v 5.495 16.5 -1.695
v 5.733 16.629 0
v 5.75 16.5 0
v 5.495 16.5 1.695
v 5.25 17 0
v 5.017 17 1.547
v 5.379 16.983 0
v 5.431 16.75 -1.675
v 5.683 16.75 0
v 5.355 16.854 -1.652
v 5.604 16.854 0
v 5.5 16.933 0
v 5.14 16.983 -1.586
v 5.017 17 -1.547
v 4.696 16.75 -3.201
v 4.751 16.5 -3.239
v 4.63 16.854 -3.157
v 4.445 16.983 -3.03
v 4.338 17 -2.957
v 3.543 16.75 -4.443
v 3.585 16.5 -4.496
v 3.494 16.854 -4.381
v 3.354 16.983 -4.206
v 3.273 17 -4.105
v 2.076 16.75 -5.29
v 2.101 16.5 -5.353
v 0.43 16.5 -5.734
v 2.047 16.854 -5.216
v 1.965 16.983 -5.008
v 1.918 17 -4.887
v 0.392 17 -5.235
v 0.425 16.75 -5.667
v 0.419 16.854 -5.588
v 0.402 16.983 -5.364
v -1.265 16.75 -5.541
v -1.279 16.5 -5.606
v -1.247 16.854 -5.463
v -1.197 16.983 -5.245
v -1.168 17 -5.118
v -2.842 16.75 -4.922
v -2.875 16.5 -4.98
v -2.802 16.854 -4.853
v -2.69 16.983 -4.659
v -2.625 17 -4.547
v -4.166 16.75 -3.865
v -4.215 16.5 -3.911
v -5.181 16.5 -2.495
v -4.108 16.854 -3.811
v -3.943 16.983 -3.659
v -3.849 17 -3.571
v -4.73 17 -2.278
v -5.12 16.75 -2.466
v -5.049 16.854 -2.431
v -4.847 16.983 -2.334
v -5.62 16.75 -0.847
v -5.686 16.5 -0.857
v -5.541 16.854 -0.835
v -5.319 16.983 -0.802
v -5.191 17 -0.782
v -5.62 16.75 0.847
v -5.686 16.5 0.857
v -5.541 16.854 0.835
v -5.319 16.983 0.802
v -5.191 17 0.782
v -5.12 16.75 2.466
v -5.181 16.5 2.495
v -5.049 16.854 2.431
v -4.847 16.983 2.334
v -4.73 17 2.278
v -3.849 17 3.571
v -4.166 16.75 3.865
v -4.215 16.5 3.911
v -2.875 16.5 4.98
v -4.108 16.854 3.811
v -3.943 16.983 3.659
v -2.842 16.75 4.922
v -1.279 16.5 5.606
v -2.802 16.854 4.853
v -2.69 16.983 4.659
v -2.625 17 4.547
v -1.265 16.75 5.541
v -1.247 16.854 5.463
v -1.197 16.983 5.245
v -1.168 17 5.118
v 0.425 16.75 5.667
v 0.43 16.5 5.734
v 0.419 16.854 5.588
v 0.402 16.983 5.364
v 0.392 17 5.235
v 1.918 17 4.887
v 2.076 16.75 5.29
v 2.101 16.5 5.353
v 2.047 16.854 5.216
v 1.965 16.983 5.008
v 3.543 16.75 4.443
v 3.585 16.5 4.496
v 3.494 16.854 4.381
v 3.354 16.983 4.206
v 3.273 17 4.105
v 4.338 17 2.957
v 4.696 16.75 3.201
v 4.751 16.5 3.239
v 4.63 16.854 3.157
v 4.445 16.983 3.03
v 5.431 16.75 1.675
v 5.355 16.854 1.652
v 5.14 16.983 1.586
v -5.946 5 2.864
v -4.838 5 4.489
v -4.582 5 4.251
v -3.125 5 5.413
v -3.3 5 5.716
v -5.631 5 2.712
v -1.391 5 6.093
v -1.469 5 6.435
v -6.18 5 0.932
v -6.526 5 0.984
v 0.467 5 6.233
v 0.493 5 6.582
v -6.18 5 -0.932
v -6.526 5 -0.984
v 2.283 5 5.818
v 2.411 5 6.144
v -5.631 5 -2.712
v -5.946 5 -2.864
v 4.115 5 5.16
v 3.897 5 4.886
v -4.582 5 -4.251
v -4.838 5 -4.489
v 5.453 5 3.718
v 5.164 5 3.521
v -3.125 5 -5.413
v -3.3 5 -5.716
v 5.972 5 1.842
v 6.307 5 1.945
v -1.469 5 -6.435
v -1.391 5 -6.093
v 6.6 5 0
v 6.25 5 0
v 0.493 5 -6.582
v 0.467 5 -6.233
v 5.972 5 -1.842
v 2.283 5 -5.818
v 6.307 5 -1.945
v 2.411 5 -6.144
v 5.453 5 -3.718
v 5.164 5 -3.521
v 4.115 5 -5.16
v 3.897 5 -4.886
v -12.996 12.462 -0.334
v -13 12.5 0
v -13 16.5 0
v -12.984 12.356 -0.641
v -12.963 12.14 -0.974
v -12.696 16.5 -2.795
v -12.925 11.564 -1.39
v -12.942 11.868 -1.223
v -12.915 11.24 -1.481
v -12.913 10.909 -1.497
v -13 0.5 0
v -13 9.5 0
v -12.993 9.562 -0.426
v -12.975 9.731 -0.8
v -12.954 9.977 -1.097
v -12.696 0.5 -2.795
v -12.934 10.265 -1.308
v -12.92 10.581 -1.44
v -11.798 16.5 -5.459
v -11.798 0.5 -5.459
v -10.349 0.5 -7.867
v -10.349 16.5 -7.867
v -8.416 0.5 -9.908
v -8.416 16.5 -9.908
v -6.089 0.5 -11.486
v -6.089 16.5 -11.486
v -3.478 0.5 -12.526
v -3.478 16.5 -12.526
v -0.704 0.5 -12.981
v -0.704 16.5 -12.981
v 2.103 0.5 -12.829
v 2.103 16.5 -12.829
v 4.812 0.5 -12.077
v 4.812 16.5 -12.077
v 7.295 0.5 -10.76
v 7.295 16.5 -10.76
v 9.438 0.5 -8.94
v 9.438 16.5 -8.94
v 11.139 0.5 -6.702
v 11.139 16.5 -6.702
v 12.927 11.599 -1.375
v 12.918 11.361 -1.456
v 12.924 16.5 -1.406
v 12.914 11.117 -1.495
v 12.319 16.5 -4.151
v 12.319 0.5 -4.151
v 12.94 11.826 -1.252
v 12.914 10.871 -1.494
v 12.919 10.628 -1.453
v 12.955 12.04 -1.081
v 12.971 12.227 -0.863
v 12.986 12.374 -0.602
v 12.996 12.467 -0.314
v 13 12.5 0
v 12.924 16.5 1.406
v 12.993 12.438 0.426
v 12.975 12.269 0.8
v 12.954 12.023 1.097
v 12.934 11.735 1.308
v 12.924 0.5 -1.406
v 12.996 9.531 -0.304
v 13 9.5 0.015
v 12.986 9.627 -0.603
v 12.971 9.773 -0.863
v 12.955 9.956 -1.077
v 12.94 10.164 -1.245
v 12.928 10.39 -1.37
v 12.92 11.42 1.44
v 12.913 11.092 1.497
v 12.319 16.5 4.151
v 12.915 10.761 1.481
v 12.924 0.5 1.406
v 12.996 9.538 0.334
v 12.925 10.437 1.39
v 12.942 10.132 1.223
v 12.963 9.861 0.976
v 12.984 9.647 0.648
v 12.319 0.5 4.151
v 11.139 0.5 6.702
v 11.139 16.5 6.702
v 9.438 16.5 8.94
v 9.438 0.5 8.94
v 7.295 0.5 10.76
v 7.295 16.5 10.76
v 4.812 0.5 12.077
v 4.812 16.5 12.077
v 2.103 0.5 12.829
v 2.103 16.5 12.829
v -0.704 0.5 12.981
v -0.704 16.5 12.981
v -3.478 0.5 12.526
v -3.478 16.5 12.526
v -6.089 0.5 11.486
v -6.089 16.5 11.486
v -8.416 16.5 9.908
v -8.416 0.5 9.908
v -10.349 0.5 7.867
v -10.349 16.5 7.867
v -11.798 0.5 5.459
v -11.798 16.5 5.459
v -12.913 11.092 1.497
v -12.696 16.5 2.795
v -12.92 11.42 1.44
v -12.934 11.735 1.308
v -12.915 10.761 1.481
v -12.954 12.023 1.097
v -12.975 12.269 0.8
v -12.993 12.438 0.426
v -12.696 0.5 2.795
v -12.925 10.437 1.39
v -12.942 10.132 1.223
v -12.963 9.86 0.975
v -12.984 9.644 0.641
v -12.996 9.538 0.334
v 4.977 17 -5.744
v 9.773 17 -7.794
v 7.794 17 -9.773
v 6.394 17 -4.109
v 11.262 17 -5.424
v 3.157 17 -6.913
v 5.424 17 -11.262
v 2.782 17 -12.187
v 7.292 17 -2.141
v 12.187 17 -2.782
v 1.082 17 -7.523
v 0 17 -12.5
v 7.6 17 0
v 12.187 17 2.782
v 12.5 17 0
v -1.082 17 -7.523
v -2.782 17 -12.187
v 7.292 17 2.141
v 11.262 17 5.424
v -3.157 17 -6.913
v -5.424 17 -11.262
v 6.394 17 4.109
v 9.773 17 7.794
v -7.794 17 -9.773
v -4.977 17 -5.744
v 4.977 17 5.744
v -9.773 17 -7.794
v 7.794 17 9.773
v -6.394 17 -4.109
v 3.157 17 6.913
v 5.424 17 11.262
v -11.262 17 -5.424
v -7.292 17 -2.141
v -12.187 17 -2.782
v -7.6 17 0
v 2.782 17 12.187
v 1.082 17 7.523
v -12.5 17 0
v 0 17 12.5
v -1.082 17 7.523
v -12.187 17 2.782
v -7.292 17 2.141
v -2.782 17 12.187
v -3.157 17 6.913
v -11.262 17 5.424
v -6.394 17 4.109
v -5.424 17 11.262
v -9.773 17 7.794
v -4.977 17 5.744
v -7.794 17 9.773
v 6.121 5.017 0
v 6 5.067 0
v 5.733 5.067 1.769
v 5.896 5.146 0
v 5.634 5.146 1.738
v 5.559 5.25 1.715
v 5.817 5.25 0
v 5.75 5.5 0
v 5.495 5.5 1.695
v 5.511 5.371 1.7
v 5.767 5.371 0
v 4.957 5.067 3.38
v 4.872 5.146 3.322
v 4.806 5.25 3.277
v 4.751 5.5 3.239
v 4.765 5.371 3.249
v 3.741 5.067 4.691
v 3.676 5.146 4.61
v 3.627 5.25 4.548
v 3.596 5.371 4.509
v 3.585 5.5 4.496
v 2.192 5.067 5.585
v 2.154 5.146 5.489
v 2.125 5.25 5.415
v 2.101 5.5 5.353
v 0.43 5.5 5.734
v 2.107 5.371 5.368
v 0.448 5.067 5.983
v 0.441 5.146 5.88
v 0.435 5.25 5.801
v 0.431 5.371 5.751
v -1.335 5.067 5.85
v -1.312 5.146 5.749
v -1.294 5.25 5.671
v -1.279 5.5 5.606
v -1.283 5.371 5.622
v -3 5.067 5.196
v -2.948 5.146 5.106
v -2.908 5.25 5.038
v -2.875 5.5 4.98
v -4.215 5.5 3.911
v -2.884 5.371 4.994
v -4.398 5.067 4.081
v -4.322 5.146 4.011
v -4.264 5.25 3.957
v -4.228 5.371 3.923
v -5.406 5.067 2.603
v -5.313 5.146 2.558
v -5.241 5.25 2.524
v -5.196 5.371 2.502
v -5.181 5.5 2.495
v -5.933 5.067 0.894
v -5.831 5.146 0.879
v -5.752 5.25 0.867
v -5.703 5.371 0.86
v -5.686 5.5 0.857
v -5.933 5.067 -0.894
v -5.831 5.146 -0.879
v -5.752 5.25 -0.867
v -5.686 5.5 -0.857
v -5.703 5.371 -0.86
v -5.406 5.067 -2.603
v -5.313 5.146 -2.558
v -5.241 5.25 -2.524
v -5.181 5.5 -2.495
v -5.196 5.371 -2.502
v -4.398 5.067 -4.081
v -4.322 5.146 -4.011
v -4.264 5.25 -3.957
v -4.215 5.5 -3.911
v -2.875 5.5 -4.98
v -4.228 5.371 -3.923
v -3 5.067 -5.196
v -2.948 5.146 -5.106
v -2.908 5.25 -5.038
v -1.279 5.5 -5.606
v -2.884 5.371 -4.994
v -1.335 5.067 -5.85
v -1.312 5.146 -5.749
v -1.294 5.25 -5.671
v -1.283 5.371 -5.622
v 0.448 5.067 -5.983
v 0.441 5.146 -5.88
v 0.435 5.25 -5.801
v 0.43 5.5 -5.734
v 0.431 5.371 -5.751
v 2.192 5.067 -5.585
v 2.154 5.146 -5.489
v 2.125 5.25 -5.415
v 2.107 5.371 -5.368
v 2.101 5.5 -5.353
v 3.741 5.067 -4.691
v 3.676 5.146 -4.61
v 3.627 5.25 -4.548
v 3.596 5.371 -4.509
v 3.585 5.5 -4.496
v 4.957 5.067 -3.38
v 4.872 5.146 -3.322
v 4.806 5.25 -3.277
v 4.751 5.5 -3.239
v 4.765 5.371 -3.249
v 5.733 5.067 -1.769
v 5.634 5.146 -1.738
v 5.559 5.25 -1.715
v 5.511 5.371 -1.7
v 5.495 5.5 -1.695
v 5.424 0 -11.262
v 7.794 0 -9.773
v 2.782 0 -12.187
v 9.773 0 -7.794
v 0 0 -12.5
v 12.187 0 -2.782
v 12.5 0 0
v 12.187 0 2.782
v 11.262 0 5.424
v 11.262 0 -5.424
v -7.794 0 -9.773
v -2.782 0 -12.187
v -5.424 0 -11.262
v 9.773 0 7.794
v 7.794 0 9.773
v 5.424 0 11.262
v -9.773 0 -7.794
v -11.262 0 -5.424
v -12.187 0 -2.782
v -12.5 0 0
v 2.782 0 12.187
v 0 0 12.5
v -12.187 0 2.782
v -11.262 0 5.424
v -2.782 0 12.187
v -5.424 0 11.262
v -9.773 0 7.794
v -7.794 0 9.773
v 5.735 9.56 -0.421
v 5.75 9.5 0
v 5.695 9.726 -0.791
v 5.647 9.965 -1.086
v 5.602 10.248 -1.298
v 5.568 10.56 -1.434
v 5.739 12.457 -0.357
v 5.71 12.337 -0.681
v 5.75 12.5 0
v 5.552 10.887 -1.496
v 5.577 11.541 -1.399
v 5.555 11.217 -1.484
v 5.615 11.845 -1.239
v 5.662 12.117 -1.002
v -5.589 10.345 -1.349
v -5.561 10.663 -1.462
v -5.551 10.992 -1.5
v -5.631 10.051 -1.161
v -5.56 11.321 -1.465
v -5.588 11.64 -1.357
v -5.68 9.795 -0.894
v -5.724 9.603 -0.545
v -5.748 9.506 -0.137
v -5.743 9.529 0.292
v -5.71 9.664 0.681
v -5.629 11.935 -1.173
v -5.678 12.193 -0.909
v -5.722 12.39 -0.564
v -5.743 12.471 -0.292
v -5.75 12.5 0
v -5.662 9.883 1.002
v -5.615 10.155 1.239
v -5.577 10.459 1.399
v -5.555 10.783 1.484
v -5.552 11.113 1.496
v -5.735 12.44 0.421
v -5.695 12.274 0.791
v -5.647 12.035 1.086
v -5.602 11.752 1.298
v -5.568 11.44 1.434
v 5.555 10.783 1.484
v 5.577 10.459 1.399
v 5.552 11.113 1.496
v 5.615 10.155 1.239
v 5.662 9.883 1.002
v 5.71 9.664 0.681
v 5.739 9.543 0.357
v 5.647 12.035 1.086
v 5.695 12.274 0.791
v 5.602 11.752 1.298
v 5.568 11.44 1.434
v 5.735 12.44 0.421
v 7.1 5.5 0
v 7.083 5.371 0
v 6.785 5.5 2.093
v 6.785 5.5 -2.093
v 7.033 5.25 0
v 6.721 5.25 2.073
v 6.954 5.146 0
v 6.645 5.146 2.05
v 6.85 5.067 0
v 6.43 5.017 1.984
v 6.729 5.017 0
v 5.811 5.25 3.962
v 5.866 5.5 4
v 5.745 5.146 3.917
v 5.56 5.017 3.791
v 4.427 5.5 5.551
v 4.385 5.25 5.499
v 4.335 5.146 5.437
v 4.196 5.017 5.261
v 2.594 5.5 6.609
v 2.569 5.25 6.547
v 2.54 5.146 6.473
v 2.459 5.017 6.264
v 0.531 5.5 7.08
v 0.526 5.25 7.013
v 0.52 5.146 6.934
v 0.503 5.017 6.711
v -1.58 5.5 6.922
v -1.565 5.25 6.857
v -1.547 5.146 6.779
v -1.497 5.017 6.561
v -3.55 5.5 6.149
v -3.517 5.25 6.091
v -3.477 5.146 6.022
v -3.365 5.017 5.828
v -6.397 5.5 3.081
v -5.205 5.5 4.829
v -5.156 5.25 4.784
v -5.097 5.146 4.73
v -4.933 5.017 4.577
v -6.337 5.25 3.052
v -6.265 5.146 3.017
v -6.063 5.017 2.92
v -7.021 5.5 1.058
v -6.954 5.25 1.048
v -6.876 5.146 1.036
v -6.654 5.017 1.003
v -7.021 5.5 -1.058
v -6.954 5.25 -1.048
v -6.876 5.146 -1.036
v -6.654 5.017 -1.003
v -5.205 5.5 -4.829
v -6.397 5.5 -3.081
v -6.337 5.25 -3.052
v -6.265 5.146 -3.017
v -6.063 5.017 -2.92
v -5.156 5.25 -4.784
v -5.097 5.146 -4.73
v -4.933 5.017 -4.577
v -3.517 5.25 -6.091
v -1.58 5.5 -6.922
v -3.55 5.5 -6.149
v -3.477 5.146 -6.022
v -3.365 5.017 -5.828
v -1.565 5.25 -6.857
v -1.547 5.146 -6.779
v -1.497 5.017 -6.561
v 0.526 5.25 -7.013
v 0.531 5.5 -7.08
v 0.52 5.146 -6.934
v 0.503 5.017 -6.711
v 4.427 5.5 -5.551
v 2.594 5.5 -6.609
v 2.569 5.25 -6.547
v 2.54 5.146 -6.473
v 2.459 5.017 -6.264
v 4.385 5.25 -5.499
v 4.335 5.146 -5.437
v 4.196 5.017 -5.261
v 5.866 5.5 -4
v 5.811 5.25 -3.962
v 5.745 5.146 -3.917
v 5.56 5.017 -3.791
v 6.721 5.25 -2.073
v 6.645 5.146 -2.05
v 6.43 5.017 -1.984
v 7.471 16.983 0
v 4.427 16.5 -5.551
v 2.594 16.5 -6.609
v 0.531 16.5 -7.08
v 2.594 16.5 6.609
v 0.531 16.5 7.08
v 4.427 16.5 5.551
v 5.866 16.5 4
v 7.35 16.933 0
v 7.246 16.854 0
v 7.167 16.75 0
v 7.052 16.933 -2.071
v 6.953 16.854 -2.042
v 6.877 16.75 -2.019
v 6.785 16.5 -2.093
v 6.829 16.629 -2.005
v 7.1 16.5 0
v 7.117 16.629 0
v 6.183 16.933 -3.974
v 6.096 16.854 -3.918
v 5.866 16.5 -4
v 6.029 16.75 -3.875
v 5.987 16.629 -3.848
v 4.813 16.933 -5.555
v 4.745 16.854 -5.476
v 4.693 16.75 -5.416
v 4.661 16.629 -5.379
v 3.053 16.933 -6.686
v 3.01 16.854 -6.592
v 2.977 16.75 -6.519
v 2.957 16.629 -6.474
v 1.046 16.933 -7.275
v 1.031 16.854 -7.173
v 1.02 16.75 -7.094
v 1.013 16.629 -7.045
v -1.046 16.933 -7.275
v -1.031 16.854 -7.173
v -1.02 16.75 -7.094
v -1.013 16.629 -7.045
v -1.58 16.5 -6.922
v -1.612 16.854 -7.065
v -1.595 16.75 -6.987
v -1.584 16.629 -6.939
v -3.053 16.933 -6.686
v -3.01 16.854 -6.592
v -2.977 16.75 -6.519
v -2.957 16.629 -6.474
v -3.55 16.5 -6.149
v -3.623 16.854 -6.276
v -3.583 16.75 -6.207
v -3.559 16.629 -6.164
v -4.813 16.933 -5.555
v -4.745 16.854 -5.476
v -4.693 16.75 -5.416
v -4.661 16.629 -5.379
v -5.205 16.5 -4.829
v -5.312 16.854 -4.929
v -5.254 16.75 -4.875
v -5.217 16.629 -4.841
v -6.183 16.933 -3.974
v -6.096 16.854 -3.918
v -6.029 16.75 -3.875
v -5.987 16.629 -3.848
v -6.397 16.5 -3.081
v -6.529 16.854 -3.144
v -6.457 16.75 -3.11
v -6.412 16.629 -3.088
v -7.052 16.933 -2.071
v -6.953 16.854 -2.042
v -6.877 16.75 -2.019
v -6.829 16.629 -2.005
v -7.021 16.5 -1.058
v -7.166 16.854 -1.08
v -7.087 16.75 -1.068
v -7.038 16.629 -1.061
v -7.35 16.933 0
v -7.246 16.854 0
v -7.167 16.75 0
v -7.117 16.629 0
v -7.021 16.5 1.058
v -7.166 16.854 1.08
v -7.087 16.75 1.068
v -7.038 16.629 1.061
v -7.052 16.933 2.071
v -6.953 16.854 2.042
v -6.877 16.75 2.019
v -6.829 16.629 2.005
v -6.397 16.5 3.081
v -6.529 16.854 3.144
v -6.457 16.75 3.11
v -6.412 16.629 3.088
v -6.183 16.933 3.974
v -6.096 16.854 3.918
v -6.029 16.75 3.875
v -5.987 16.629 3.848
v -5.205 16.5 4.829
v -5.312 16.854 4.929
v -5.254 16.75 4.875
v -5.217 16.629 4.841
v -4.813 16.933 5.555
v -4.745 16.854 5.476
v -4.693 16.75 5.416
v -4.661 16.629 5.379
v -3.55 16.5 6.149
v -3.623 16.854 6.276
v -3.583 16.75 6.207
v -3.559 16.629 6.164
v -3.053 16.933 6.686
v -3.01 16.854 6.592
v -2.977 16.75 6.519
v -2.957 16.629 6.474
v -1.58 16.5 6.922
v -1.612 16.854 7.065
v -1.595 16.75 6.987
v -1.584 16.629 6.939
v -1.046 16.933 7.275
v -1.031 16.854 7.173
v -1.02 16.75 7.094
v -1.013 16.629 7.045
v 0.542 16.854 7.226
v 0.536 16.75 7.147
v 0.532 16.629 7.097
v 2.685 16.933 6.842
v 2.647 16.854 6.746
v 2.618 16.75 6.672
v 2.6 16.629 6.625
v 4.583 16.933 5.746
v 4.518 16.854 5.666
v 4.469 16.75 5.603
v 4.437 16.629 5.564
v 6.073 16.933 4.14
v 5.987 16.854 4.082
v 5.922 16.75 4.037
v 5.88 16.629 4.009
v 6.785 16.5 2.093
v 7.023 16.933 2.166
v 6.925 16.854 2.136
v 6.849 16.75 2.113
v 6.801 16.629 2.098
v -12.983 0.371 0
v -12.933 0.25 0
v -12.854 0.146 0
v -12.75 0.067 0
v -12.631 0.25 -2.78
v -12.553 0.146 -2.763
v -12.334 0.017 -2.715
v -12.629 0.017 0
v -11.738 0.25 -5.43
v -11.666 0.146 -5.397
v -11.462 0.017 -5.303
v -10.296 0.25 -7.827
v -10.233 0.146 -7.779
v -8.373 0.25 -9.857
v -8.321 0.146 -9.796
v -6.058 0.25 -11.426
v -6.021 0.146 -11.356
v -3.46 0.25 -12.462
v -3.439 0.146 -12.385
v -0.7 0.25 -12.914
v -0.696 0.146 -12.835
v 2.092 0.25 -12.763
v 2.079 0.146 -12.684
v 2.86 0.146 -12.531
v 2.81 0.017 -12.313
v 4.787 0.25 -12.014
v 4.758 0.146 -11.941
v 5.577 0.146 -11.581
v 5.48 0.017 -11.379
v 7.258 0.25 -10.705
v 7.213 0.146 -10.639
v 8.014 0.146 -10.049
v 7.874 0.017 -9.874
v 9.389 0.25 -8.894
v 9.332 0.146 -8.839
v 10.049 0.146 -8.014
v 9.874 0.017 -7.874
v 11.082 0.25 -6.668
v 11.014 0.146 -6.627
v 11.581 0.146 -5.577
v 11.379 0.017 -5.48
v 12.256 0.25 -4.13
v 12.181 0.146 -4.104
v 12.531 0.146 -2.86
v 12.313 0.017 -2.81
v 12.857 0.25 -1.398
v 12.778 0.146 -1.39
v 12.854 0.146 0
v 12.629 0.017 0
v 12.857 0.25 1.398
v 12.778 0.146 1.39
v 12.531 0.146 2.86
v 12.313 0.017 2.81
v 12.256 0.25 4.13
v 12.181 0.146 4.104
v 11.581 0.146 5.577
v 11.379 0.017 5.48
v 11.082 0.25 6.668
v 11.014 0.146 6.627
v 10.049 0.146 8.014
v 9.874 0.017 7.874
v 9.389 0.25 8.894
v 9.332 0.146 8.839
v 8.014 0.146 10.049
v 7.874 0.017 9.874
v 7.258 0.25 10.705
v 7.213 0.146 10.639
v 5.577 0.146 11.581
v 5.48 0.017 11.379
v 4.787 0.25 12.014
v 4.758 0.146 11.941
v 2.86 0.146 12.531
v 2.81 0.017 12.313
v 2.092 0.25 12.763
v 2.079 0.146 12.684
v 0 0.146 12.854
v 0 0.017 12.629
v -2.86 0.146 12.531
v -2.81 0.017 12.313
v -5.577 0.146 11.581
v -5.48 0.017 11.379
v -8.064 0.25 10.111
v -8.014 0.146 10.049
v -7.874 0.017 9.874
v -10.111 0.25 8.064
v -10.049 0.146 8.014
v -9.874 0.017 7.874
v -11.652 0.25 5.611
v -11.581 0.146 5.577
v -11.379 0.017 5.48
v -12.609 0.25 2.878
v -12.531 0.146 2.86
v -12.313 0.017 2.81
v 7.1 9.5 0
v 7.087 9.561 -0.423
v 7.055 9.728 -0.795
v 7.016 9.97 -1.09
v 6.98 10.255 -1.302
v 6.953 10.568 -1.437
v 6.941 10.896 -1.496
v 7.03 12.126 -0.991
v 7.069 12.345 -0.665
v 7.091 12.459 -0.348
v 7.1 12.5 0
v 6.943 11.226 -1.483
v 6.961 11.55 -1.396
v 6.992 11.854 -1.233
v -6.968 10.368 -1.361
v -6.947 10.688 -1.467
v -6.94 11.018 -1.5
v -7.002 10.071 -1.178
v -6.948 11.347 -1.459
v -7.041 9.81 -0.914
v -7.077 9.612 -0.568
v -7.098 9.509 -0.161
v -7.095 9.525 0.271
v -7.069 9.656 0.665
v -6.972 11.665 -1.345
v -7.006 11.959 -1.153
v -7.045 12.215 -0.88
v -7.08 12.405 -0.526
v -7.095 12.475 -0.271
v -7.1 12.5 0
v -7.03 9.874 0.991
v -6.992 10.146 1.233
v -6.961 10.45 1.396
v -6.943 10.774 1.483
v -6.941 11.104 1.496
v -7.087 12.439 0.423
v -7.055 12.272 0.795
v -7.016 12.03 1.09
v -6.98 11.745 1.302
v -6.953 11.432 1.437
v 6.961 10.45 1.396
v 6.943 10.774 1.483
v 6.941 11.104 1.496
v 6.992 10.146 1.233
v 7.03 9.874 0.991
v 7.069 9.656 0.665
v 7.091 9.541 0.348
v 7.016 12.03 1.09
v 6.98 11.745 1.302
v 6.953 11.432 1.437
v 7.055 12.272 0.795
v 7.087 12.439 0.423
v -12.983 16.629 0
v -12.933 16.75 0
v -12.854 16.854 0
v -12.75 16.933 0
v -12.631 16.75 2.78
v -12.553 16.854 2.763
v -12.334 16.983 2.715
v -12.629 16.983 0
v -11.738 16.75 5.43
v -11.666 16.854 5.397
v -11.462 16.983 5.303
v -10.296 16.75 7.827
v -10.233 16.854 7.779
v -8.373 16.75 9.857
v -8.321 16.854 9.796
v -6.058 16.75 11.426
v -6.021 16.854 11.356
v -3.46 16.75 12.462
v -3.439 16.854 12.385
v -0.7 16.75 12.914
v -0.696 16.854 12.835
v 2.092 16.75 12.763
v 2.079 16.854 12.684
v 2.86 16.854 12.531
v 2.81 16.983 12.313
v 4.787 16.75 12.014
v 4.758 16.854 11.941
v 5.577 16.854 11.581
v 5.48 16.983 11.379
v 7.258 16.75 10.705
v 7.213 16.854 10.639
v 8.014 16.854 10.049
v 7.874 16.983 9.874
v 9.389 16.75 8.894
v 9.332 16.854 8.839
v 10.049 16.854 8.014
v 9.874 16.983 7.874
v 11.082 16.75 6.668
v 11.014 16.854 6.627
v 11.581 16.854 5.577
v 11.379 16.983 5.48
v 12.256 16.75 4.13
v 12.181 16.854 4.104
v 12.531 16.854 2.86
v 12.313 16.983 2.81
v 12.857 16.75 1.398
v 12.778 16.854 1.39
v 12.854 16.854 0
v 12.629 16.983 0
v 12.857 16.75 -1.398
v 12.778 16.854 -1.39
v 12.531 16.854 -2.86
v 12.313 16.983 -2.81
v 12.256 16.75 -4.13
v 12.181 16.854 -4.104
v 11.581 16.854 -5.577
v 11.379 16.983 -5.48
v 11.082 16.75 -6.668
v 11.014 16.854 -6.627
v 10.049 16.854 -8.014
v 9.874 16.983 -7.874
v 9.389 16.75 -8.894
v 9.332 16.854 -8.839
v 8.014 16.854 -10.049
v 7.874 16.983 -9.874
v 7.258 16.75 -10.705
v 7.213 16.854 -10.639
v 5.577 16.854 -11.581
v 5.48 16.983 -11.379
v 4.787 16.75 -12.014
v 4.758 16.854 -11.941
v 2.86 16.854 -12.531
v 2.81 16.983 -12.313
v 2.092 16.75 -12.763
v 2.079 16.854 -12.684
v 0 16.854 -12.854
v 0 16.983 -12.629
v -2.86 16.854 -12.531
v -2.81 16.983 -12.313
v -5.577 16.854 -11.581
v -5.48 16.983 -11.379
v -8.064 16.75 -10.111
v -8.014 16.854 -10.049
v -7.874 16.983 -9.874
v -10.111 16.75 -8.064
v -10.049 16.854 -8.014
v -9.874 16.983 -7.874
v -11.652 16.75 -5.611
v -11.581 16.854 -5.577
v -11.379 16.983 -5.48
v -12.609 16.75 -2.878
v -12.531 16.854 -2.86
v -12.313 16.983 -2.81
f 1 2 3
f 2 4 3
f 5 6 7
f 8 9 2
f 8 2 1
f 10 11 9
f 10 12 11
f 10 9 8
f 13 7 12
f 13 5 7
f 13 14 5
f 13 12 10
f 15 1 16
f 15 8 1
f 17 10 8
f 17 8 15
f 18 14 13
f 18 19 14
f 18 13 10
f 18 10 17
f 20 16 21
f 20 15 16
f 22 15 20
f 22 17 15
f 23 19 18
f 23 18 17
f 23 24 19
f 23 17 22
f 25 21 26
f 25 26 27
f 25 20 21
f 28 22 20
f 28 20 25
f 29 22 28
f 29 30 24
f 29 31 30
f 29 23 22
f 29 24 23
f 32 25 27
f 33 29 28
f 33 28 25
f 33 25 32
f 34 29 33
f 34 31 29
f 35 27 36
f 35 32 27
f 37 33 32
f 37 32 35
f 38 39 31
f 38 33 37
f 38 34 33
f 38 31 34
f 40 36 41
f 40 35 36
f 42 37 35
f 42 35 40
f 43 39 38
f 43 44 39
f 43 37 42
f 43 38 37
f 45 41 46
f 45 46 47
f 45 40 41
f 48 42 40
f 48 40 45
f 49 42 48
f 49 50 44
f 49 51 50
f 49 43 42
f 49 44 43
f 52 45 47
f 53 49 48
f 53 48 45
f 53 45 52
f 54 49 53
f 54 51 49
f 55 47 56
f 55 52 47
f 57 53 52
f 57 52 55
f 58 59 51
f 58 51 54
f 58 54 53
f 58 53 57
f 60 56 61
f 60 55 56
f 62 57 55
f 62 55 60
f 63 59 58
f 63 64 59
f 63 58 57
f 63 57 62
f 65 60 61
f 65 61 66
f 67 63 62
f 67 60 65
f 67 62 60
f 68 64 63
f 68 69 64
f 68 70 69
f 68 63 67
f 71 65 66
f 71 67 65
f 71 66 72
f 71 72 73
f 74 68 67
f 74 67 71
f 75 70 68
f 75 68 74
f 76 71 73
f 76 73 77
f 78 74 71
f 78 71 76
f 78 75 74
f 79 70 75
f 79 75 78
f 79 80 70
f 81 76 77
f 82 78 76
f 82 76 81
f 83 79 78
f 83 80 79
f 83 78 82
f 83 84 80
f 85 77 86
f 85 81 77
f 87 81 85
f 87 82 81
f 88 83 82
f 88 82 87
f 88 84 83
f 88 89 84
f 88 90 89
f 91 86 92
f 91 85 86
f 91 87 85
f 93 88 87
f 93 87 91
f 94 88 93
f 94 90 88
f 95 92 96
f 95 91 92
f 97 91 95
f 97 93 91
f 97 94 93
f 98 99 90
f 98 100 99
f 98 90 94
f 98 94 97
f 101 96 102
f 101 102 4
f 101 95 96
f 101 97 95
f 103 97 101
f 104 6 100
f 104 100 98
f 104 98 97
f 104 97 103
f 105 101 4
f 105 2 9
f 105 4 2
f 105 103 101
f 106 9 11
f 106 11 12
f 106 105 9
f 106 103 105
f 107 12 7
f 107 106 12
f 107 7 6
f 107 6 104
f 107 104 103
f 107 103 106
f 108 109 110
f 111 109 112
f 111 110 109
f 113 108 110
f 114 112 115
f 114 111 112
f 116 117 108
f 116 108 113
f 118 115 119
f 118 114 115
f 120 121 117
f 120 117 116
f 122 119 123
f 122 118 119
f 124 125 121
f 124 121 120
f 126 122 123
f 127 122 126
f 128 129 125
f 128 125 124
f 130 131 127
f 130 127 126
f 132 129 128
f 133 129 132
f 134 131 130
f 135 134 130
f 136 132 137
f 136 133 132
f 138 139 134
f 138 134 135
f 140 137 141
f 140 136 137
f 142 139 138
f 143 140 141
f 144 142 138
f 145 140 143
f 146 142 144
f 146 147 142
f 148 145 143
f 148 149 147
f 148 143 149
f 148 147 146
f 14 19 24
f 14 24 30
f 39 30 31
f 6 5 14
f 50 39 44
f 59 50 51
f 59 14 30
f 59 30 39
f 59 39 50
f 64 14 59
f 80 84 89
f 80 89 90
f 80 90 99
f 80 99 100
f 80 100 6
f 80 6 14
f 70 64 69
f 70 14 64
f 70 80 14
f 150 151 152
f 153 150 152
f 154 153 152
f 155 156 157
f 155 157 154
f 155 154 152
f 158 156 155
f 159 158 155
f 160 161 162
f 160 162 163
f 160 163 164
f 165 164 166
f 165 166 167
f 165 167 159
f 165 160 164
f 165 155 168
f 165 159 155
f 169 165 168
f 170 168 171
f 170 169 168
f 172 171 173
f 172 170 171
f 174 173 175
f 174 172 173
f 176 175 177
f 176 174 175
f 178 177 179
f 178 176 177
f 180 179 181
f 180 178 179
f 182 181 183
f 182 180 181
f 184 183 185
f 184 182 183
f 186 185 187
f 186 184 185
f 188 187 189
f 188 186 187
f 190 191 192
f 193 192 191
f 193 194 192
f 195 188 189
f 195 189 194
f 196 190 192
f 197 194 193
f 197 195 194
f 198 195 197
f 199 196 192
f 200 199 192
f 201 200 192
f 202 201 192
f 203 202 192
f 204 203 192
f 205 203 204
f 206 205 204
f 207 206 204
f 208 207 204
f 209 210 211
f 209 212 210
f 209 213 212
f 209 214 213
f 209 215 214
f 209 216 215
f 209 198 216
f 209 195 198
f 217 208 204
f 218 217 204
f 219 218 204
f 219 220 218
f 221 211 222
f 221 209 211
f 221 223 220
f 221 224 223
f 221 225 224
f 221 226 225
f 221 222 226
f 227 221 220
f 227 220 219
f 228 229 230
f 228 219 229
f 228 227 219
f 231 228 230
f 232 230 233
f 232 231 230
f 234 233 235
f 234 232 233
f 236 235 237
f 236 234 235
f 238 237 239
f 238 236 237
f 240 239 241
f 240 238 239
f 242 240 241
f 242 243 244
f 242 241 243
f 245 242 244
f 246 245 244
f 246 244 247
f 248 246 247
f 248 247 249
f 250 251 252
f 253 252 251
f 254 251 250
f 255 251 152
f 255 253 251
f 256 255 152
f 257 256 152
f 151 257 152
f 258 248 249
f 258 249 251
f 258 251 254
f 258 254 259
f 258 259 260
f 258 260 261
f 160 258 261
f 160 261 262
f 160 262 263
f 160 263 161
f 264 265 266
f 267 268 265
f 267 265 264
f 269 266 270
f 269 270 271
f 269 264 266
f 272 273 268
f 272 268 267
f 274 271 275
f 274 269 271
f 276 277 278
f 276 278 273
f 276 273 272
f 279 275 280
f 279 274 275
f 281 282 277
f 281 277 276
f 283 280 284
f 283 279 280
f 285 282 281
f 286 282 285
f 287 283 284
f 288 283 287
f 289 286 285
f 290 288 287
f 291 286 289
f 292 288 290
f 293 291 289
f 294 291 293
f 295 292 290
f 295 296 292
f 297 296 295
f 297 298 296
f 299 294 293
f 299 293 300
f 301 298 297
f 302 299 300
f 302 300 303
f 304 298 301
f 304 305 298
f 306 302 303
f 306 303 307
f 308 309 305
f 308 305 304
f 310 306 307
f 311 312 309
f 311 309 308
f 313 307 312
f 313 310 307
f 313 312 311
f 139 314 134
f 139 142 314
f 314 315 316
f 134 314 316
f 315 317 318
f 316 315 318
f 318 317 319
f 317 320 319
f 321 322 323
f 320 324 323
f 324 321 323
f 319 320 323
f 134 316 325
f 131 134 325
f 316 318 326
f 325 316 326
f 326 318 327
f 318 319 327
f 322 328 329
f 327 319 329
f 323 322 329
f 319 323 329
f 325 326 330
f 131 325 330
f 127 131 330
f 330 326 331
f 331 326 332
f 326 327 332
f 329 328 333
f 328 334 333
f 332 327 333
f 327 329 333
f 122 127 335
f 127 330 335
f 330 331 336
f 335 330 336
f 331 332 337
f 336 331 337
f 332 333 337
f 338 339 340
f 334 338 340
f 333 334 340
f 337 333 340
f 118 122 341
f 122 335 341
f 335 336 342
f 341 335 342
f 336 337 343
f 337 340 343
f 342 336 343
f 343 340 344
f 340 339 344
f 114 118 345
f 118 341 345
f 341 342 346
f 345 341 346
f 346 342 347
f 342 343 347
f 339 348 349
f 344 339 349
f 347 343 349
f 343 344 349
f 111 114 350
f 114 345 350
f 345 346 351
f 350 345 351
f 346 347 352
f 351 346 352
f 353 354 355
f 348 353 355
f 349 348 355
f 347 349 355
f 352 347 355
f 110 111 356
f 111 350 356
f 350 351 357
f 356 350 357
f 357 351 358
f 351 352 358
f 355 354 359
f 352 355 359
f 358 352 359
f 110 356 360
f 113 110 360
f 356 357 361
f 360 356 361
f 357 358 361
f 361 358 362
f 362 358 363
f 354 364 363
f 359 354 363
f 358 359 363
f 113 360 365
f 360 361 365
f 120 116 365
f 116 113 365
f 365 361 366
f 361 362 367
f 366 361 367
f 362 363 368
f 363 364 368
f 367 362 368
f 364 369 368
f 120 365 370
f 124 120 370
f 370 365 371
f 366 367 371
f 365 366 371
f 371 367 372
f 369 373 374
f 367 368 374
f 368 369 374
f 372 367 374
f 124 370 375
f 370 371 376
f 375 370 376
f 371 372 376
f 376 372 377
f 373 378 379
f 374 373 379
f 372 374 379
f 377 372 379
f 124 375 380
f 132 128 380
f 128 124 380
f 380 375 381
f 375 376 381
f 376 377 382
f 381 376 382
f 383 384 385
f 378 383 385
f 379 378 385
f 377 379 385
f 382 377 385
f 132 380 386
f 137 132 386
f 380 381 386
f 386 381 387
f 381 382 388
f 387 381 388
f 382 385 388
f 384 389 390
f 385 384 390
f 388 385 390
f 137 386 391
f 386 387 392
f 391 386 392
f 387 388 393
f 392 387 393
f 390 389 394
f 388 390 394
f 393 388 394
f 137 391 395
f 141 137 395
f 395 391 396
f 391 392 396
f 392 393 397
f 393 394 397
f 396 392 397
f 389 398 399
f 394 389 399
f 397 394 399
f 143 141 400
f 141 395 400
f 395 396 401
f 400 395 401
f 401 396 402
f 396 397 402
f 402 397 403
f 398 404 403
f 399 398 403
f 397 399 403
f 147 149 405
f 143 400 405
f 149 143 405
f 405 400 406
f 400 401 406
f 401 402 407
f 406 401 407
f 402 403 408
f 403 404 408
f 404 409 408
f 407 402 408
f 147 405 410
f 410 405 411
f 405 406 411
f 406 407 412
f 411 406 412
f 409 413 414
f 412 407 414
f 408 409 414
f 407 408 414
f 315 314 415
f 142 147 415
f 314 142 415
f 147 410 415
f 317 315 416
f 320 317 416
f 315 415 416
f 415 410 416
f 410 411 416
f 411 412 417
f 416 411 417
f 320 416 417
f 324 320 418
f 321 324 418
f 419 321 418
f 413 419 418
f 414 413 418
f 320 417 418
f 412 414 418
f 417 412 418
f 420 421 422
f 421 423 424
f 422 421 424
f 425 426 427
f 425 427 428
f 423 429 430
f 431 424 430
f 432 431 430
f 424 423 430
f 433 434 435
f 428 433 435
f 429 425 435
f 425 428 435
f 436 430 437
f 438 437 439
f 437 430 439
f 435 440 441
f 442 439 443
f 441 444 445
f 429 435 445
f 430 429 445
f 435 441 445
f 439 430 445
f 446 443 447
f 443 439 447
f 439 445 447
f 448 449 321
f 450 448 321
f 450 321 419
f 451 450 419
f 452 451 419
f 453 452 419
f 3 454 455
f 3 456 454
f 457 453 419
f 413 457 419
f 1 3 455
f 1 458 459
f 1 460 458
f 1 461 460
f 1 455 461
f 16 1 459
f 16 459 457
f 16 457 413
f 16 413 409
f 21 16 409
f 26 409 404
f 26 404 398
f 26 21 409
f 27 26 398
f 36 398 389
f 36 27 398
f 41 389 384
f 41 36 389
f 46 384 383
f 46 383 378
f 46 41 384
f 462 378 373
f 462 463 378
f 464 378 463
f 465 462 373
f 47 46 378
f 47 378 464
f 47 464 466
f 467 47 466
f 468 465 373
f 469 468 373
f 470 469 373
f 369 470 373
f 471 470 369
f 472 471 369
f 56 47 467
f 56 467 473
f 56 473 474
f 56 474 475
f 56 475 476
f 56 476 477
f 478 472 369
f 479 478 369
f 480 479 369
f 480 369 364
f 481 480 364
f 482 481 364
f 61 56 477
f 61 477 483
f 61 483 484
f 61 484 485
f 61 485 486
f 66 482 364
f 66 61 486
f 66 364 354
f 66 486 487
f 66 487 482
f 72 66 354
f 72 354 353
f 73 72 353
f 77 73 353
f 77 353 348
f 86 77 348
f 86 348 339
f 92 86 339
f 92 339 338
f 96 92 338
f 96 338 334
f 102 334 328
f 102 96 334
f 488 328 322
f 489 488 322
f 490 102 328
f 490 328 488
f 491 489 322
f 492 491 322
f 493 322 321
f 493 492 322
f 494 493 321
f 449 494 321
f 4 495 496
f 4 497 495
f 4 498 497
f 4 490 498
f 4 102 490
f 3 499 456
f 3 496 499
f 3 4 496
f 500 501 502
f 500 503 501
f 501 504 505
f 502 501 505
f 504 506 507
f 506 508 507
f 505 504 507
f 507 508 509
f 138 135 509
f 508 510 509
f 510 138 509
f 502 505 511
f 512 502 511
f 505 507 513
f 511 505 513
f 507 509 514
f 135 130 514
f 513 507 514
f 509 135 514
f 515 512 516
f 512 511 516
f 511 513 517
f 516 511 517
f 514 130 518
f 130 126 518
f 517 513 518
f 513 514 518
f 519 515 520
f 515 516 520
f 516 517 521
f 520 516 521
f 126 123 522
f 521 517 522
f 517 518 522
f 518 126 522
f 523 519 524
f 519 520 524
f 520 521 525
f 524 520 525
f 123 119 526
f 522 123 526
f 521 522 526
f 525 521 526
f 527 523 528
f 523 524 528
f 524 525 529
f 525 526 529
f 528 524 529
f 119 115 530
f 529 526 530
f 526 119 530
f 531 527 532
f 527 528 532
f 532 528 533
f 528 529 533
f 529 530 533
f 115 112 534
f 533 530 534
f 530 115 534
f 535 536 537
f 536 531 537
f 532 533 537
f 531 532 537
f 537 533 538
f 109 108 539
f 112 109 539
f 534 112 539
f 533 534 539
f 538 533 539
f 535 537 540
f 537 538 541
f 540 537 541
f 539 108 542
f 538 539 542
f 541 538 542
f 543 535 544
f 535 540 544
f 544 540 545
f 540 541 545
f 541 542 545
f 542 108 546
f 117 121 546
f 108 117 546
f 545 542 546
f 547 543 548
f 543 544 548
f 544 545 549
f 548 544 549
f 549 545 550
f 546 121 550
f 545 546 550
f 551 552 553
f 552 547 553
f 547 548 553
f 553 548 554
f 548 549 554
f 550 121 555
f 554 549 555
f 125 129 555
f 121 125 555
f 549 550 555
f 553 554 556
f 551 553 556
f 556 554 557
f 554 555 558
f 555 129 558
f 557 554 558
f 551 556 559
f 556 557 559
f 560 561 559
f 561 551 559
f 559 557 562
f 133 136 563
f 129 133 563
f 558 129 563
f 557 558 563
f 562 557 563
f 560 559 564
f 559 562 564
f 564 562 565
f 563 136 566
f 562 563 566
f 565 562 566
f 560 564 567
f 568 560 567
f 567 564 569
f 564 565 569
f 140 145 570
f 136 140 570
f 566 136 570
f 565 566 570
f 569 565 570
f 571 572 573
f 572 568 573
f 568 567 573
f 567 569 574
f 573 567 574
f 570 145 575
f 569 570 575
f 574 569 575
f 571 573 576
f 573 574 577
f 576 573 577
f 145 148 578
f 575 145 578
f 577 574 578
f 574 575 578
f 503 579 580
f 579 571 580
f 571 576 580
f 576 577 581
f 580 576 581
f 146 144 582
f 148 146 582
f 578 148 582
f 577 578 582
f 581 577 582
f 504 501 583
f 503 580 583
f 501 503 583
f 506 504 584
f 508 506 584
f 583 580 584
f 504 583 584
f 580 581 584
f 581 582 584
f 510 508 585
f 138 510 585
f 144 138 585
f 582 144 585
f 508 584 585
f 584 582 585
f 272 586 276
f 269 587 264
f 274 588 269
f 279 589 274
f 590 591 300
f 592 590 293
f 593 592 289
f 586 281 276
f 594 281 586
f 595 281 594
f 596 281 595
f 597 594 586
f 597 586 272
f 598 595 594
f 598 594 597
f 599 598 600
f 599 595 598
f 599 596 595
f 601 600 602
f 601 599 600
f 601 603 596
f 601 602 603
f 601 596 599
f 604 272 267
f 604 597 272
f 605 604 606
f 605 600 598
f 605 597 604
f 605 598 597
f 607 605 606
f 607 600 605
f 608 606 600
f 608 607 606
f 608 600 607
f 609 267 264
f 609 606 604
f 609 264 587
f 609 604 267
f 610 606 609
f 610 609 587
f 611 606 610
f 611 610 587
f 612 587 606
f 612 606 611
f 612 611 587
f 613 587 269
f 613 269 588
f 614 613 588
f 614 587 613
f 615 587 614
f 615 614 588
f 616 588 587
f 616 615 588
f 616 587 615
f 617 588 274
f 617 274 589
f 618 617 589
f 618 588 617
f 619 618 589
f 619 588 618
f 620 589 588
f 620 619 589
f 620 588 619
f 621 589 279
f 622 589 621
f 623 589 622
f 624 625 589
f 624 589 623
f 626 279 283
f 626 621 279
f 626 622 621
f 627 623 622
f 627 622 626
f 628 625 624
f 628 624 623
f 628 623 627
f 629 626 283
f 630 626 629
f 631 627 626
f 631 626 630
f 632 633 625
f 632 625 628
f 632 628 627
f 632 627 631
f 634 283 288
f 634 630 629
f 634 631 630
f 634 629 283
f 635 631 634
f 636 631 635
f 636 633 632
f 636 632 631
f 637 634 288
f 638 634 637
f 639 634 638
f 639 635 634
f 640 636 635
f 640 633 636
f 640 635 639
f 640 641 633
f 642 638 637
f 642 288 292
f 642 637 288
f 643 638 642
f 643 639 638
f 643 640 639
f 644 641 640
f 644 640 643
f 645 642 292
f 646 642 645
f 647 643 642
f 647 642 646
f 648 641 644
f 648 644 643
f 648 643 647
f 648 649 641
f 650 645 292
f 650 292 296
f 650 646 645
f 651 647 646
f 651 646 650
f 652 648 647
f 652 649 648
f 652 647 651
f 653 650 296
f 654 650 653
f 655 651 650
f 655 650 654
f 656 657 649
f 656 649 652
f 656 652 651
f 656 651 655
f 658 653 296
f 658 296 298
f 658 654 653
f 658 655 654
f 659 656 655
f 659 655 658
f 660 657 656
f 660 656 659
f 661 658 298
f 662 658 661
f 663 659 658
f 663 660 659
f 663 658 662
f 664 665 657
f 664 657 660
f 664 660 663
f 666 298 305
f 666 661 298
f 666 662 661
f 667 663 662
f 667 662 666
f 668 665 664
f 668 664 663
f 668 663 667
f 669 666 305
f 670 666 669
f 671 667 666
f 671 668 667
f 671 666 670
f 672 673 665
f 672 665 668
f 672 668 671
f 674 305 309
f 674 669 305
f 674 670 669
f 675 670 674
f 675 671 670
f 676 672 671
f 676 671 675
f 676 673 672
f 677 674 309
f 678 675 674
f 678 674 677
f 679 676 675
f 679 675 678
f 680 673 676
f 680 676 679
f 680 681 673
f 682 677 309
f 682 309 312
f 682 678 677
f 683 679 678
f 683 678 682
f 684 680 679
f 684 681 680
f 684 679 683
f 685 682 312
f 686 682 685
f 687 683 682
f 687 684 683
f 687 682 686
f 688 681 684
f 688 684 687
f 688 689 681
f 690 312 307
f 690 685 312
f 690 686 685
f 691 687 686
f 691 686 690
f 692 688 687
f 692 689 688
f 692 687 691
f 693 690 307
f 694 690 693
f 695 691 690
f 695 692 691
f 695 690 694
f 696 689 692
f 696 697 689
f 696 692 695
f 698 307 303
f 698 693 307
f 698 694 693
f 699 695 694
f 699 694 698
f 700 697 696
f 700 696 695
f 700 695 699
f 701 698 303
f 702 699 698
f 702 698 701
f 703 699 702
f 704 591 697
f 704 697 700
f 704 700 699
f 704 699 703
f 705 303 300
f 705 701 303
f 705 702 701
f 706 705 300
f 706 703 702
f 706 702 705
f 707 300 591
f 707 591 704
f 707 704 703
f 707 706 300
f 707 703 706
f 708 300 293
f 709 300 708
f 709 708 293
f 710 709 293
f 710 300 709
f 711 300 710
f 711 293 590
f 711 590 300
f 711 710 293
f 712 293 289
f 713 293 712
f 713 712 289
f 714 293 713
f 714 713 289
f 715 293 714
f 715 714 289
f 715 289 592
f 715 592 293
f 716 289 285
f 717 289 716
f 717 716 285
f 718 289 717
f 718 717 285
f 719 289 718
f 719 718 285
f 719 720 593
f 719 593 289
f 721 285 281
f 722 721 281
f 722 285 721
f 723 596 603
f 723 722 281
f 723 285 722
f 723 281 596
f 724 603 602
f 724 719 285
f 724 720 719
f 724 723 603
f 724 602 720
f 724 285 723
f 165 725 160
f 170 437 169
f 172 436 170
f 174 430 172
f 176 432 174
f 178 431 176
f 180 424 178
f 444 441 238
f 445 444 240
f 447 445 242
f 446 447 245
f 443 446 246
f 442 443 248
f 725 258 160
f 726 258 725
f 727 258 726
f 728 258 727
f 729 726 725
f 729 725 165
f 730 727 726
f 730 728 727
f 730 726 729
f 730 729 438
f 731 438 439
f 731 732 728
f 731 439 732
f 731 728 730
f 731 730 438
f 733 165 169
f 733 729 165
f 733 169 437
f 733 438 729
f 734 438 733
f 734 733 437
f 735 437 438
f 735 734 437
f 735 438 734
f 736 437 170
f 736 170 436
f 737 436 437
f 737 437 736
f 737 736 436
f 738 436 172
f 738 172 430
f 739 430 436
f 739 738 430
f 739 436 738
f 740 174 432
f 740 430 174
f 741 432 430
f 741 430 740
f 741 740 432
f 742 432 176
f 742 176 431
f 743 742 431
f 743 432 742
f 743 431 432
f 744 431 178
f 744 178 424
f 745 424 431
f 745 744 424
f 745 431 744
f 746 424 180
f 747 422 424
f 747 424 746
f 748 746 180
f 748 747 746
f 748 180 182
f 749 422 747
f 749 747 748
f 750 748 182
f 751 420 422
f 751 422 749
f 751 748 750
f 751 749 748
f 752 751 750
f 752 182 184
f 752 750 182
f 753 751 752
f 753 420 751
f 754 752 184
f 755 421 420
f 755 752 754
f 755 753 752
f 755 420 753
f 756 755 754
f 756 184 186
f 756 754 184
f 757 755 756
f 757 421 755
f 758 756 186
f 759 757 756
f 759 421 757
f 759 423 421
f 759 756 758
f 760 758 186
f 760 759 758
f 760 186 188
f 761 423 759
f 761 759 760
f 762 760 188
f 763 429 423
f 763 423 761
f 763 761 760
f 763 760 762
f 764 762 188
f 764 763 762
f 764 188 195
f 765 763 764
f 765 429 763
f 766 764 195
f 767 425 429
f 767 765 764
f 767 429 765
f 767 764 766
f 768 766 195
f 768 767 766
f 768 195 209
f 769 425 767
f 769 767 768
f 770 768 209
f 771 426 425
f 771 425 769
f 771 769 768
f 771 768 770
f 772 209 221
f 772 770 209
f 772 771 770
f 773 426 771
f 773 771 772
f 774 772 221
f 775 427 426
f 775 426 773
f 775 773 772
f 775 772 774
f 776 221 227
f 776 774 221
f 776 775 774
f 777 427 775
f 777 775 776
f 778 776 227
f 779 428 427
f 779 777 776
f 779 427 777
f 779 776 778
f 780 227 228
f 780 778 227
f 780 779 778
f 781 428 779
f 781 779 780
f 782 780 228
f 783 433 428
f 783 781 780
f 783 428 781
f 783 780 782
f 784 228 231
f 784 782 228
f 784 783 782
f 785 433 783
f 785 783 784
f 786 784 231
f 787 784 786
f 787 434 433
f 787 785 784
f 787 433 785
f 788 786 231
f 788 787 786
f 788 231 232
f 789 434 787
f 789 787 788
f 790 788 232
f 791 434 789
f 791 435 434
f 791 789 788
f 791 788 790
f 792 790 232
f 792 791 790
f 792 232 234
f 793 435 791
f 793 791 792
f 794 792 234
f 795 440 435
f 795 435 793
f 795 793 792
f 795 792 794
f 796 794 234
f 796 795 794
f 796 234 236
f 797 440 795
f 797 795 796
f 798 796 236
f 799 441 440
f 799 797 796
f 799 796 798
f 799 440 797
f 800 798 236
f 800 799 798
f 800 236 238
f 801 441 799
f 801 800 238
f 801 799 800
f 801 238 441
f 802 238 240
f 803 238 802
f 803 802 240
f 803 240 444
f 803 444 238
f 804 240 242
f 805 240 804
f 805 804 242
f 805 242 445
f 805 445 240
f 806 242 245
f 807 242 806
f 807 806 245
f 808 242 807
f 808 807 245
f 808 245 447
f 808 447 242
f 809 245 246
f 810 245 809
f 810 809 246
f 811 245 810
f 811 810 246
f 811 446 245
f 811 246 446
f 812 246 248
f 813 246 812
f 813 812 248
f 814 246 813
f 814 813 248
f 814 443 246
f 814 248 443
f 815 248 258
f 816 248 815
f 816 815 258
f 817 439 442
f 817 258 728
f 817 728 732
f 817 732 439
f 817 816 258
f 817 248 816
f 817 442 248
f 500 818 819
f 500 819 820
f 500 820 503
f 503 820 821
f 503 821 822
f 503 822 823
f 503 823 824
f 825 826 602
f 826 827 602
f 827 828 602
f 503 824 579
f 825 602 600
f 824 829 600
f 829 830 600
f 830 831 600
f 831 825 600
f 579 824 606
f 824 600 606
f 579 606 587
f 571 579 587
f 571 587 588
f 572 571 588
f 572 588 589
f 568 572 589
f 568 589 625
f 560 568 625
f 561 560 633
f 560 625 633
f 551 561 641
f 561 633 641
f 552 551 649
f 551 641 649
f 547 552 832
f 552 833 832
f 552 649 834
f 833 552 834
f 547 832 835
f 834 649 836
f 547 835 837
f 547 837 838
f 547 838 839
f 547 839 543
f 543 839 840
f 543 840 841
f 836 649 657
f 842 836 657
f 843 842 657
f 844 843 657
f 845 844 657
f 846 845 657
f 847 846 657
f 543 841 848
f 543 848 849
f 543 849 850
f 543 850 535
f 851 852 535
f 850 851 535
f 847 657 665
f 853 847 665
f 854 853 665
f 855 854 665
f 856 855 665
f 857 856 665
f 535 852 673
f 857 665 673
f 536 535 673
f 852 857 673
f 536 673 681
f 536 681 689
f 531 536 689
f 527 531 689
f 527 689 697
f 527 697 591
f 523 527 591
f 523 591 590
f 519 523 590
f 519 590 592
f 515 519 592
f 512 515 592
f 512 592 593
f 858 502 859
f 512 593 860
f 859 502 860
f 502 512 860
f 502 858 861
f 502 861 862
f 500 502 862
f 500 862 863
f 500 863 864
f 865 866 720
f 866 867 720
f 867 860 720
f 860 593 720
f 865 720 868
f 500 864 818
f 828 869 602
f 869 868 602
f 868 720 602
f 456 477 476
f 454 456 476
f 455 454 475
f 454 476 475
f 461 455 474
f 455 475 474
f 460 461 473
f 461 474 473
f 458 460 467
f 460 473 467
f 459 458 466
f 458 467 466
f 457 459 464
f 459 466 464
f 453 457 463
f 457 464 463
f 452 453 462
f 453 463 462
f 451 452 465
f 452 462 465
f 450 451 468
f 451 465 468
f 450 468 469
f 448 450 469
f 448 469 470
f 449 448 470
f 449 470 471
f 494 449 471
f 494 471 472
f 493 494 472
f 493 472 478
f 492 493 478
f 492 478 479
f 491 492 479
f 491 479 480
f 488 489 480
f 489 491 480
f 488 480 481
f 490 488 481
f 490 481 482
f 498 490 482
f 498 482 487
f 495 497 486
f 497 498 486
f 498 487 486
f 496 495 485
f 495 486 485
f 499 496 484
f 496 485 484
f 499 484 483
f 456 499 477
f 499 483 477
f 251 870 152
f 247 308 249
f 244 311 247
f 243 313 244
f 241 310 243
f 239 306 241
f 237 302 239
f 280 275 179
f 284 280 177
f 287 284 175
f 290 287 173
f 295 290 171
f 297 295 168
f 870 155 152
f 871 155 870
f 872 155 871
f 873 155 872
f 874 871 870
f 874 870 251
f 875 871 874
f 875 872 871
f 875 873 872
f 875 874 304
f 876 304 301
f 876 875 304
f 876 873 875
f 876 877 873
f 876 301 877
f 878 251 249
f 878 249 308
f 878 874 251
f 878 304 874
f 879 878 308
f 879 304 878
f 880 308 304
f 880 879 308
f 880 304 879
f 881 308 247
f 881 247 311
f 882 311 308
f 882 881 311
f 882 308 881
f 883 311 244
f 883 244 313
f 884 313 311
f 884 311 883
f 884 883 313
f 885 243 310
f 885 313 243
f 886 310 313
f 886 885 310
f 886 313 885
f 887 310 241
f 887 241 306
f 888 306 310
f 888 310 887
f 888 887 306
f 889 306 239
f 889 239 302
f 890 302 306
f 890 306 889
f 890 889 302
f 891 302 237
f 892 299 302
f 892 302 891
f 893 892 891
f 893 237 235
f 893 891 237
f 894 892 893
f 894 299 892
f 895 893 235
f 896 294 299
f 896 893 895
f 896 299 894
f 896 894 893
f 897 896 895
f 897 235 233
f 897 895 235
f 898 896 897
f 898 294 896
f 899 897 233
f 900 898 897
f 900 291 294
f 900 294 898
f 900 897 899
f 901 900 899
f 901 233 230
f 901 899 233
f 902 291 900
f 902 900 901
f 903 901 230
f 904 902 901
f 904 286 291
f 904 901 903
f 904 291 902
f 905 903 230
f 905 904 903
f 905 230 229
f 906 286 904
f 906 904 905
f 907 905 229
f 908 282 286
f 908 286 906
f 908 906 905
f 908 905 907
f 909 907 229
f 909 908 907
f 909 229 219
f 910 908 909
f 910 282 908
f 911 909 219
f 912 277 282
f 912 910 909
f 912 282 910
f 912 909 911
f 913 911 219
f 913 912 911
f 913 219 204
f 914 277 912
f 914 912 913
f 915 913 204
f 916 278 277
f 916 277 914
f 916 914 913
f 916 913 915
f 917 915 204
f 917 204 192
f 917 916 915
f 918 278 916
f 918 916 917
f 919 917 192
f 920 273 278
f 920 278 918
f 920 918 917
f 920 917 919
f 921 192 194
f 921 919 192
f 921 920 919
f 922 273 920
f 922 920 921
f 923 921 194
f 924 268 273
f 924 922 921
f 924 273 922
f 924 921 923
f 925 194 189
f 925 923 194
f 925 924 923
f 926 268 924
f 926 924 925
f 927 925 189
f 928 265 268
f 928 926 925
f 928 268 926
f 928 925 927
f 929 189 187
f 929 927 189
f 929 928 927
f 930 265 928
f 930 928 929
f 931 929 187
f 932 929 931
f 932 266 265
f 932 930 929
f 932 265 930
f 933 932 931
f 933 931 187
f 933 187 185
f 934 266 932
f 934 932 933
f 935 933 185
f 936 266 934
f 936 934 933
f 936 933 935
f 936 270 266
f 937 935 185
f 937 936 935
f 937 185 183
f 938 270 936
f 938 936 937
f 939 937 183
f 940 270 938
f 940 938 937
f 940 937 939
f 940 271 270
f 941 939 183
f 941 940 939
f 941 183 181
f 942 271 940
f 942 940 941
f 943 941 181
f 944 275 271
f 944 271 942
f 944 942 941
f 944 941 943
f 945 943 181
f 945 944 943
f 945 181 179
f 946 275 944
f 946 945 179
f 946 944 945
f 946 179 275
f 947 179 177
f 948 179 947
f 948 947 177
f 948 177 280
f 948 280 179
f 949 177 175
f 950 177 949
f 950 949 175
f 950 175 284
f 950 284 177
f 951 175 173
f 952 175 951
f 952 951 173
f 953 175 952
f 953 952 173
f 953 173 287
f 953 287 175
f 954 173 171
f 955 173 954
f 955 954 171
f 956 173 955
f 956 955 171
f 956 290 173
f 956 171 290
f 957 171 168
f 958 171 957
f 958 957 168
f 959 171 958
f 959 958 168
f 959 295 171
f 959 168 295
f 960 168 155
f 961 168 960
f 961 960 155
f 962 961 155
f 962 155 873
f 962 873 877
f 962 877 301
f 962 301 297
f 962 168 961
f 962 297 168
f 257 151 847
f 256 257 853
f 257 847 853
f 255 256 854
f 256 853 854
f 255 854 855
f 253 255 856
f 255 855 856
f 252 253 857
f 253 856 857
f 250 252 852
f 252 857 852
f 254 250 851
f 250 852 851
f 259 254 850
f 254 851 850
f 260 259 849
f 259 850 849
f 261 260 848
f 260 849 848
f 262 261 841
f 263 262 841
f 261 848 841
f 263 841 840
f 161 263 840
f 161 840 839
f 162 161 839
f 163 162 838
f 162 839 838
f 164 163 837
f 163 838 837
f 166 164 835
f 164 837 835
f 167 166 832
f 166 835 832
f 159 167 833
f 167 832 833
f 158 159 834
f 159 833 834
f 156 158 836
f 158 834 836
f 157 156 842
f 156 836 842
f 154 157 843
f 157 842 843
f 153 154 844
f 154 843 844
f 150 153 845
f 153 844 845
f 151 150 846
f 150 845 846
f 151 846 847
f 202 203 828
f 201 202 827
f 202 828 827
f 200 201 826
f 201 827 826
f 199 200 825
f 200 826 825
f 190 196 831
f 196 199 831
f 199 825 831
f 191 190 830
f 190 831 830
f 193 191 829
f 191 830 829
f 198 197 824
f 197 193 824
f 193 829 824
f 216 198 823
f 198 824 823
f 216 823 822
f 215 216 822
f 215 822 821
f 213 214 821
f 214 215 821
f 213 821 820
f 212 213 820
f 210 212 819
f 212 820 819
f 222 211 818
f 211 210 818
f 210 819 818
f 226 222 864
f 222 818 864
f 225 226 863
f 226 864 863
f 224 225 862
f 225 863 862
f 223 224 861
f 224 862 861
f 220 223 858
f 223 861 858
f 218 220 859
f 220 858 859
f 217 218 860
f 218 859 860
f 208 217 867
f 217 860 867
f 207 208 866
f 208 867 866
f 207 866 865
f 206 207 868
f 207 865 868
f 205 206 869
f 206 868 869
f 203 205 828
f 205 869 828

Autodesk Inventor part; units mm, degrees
ref_plane "YZ Plane" through (0, 0, 0) normal (1, 0, 0) x (0, 1, 0)
ref_plane "XZ Plane" through (0, 0, 0) normal (0, 1, 0) x (-1, 0, 0)
ref_plane "XY Plane" through (0, 0, 0) normal (0, 0, 1) x (1, 0, 0)
sketch "Esquisse1" plane through (0, 0, 0) normal (0, 1, 0) x (-1, 0, 0)
  circle A0 centre (0, 0) radius 13
  dimension "d0" = 26
extrude "Extrusion1" add sketch "Esquisse1" along normal blind 17
sketch "Esquisse2" plane through (0, 17, 0) normal (0, 1, 0) x (1, 0, 0)
  circle A0 centre (0, 0) radius 5.75
  circle A1 centre (0, 0) radius 7.1
  dimension "d3" = 11.5
  dimension "d4" = 14.2
extrude "Extrusion2" cut sketch "Esquisse2" against normal blind 12
fillet "Congé1" radius 0.5 6 edges at (13, 17, 0) (-5.75, 17, 0) (-7.1, 17, 0) (13, 0, 0) (-7.1, 5, 0) (-5.75, 5, 0)
sketch "Esquisse3" plane through (0, 0, 0) normal (1, 0, 0) x (0, 1, 0)
  circle A0 centre (11, 0) radius 1.5
  line L0 (17, 12.5) -> (17, -12.5) projected
  point P0 (0, 0)
  dimension "d8" = 3
  dimension "d9" = 6
extrude "Extrusion3" cut sketch "Esquisse3" along normal through all both and the other way through all
properties part number "attache_finaxe_central"
